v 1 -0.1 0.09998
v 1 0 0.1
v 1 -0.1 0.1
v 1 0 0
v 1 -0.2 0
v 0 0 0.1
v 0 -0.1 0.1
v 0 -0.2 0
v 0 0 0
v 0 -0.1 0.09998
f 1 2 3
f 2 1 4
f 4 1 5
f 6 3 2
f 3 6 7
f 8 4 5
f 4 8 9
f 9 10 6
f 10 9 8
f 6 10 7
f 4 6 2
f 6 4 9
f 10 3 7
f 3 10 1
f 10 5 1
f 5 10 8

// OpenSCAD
translate([0,-.1, 0])
cube([1,.1,.1]);

rotate([0,90,0])
linear_extrude(1, false, convexity=1, twist=0, slices=1) {
    polygon([[0, -.2], [-.1, -.1], [0, 0]]);
}
